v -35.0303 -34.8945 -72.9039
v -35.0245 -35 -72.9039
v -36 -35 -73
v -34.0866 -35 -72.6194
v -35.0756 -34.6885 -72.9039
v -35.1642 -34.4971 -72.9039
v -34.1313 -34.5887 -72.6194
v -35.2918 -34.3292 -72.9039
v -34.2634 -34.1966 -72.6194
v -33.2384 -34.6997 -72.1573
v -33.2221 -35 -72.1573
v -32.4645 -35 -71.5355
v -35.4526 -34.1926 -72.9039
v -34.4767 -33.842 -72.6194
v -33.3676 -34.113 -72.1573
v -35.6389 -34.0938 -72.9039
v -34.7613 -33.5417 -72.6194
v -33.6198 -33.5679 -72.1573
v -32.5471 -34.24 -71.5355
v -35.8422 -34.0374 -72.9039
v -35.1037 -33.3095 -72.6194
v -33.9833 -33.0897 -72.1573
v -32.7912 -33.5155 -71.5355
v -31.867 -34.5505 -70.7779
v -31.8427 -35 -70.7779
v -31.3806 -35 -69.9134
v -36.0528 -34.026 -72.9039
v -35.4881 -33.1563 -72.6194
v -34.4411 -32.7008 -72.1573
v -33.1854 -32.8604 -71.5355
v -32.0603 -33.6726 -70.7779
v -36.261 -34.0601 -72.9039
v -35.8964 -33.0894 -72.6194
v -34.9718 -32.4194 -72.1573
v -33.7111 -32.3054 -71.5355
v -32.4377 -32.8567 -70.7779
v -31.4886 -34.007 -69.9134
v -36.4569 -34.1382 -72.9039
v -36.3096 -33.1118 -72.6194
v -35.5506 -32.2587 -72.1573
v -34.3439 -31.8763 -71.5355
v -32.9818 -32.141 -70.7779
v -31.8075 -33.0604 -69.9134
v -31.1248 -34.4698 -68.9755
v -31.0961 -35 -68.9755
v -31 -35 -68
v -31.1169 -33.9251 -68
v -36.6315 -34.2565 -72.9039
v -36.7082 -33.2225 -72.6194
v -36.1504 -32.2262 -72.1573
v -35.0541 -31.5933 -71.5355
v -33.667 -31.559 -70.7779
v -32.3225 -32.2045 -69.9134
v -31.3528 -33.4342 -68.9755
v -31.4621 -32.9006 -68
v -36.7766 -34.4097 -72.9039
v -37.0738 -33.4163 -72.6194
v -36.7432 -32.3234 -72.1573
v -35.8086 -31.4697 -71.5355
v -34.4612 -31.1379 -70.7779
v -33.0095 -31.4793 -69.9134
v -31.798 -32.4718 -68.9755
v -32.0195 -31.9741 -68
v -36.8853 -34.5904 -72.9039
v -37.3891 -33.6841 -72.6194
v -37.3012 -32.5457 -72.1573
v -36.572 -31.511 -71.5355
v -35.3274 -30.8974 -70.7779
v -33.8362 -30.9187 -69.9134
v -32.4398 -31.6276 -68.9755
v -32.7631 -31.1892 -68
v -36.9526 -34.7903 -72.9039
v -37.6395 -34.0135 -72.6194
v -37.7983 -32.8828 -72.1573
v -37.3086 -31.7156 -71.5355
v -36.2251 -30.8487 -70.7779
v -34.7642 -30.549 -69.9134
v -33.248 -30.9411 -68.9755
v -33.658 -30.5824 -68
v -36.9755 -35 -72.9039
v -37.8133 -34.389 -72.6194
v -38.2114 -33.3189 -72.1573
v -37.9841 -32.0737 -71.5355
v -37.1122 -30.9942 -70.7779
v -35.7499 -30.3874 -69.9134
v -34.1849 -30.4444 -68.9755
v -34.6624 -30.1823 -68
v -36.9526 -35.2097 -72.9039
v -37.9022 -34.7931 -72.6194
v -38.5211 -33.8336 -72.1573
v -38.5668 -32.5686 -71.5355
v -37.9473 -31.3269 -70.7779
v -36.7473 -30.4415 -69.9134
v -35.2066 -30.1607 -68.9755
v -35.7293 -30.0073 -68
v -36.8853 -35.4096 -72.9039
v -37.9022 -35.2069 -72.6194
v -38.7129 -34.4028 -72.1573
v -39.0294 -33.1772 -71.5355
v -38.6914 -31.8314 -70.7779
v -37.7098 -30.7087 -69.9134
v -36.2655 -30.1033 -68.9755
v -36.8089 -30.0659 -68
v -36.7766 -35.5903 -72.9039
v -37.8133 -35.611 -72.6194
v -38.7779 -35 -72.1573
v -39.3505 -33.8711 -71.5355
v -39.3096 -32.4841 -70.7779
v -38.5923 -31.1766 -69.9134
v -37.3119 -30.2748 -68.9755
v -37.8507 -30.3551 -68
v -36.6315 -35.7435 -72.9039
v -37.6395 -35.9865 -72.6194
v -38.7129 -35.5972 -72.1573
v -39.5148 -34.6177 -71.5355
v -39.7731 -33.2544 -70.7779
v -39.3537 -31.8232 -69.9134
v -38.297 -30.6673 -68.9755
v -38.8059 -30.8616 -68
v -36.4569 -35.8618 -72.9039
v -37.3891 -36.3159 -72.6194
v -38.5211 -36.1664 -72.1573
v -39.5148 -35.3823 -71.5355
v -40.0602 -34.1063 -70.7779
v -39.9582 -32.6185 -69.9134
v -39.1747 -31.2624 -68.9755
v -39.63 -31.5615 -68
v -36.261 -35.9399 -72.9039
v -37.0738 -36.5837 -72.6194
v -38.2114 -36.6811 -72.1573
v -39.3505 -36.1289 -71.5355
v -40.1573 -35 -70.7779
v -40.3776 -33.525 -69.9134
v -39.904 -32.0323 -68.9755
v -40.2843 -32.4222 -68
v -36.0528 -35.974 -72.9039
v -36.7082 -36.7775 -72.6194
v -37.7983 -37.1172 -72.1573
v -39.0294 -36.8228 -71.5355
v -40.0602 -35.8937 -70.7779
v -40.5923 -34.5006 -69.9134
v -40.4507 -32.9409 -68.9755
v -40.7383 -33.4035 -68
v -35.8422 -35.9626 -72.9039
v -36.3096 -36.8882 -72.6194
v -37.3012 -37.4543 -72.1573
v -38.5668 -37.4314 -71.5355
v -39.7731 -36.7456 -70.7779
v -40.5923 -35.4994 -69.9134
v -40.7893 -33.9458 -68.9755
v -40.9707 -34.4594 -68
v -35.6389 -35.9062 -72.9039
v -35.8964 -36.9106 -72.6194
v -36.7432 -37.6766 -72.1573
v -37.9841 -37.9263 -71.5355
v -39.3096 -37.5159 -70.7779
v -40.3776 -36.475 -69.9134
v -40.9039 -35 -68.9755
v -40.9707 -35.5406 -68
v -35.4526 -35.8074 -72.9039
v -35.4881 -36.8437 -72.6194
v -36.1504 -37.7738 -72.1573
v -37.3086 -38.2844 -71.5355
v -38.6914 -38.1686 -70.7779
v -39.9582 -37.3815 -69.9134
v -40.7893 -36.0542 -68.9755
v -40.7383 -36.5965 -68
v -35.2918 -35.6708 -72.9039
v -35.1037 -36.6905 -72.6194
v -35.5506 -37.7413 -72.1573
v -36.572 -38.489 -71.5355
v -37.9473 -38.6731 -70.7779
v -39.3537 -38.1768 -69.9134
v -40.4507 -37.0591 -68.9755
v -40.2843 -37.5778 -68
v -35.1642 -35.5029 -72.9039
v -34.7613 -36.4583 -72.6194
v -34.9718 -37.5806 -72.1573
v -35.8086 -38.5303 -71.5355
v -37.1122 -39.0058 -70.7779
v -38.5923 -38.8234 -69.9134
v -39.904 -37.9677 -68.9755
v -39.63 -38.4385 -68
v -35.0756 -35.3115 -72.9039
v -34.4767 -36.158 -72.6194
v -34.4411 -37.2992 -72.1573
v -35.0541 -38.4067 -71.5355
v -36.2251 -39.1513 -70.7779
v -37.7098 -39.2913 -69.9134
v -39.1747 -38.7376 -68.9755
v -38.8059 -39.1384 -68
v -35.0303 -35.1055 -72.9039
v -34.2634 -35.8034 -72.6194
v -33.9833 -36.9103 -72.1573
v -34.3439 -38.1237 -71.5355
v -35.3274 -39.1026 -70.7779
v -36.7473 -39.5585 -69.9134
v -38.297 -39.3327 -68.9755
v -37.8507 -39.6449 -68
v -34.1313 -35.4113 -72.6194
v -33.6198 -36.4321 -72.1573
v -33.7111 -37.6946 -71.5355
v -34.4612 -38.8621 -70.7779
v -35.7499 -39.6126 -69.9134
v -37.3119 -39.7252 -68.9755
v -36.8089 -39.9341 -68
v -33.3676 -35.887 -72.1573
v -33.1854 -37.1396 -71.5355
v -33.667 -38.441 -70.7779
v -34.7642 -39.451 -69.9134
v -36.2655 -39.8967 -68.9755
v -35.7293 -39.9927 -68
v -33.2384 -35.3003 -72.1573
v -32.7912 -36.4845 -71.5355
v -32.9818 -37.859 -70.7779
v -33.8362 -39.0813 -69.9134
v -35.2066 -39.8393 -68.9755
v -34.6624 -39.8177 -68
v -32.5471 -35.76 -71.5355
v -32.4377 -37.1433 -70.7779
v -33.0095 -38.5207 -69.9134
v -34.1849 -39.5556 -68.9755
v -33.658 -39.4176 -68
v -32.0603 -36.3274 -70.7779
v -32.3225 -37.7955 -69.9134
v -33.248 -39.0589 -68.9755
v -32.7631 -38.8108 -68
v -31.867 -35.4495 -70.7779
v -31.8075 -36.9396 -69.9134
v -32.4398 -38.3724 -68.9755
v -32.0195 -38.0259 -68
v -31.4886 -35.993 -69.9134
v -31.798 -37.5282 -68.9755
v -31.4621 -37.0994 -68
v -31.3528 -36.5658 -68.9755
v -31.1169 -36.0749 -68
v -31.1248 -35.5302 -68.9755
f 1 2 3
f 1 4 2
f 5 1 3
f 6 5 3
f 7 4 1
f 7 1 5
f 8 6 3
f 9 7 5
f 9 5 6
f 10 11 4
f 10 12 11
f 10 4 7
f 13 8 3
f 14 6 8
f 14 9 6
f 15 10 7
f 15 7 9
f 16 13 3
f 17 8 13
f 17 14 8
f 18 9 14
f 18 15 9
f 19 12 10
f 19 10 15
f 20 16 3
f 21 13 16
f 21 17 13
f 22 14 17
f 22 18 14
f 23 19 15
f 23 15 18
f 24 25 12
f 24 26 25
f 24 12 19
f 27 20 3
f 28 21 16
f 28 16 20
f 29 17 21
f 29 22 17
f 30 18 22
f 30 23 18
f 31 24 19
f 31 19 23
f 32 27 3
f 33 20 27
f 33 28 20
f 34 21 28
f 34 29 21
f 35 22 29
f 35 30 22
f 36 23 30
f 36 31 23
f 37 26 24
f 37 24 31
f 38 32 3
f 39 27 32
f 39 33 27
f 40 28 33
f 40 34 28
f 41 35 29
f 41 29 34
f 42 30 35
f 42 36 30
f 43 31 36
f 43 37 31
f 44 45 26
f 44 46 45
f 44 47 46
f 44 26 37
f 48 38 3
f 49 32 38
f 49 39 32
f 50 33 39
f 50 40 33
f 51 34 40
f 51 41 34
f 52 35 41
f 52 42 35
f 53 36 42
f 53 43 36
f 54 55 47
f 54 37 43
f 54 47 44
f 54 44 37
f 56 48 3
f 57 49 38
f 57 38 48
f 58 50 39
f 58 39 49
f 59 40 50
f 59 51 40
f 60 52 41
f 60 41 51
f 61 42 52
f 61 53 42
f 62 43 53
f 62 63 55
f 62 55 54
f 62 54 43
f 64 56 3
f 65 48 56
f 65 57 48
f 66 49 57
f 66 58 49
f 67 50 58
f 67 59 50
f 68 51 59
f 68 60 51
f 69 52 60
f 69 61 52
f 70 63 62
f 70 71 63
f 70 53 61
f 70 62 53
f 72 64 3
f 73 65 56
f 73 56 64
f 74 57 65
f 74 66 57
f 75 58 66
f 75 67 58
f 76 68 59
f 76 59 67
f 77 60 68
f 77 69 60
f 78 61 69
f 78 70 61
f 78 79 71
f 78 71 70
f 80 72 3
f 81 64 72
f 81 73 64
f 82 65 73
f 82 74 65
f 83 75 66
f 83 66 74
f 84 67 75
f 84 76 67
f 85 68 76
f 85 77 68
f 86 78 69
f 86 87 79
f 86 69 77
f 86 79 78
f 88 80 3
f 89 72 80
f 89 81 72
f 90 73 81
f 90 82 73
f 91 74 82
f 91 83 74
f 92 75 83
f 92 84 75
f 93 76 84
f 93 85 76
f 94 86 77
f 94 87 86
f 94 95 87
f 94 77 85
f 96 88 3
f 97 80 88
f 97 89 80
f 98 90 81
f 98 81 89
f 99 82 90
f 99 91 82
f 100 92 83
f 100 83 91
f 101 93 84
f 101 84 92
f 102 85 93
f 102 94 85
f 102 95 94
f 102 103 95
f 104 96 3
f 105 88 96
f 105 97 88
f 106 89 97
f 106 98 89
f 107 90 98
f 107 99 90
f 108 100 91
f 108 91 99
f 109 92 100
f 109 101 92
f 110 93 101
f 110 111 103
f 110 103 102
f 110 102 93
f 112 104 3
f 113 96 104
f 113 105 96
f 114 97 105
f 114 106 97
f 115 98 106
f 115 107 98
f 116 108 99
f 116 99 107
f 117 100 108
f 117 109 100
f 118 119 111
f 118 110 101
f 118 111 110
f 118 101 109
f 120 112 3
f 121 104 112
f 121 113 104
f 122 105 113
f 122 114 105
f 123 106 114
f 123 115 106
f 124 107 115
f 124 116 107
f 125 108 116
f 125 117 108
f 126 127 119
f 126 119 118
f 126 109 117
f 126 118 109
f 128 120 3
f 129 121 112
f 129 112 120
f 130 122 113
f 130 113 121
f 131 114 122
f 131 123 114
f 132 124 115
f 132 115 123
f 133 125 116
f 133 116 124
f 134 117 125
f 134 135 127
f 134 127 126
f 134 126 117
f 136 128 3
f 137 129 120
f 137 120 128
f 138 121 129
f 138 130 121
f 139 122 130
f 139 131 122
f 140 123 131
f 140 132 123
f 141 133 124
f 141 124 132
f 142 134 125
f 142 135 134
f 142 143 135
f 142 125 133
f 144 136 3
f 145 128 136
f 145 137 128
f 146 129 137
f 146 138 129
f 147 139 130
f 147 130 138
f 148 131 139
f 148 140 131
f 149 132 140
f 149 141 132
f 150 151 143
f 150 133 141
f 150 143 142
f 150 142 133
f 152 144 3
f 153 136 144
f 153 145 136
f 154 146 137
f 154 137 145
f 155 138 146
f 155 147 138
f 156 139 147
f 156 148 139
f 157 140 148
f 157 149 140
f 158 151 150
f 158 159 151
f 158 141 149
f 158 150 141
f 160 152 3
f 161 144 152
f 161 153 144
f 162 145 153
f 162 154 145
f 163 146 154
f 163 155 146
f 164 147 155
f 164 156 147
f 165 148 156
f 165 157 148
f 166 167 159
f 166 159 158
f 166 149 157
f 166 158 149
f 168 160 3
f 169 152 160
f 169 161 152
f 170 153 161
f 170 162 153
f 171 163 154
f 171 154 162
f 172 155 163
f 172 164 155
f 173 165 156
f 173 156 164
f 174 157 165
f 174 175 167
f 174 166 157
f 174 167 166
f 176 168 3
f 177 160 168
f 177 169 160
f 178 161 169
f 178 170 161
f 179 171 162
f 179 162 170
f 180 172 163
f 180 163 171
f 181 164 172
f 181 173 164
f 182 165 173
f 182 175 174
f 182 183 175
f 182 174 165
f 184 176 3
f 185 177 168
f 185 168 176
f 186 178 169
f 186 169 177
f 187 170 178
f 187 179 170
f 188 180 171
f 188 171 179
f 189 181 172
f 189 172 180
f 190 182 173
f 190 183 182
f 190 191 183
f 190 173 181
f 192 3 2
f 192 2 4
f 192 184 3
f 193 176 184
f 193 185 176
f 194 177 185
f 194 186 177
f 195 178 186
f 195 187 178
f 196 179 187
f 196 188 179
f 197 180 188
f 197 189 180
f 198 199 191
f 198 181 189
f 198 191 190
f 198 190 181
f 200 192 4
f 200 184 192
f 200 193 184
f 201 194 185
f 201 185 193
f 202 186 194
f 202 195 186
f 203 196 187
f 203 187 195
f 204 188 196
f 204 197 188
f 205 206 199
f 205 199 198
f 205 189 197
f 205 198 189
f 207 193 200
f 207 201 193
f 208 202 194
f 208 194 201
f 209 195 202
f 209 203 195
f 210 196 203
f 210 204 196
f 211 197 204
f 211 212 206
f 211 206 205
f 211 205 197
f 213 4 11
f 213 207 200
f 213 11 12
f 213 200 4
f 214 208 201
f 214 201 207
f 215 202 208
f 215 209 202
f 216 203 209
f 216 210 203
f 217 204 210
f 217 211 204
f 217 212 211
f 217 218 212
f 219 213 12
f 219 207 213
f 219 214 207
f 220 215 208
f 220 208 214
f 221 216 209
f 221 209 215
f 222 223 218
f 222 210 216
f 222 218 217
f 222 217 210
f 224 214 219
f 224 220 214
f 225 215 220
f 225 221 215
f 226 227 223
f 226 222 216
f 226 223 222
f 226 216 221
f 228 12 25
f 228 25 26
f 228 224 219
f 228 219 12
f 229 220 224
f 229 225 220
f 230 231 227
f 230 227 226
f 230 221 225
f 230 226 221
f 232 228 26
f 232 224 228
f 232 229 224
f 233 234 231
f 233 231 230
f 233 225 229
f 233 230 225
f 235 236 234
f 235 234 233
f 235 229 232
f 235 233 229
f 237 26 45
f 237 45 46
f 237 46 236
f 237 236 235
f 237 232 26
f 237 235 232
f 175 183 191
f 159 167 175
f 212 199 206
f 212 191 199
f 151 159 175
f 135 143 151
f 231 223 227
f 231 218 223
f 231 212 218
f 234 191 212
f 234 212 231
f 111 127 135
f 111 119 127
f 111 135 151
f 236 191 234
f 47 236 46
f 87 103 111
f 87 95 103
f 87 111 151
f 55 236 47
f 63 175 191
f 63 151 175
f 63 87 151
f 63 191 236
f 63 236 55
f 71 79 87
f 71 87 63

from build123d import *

# Parameters (mm, degrees)
BOX002_W     = 10
BOX002_H     = 10
BOX002_DEPTH = 10


with BuildPart() as cubo002:
    # Box002 → Box002 (new body)
    with BuildSketch(Plane(origin=(-5, -5, 0), x_dir=(1, 0, 0), z_dir=(0, 0, 1))):
        with Locations((5, 5)):
            Rectangle(BOX002_W, BOX002_H)
    extrude(amount=BOX002_DEPTH)


with BuildPart() as cut:
    # Sphere → Sphere (revolve)
    with BuildSketch(Plane.XZ):
        with BuildLine():
            ThreePointArc((0, -5), (5, 0), (0, 5))
            Line((0, 5), (0, -5))
        make_face()
    revolve(axis=Axis((0, 0, 0), (0, 0, 1)))

    # Cut: cut Cubo002
    add(cubo002.part, mode=Mode.SUBTRACT)


with BuildPart() as cut_1:
    # Cut placement: moved
    add(cut.part.moved(Location((-36, -35, -68))))


solid = cut_1.part
